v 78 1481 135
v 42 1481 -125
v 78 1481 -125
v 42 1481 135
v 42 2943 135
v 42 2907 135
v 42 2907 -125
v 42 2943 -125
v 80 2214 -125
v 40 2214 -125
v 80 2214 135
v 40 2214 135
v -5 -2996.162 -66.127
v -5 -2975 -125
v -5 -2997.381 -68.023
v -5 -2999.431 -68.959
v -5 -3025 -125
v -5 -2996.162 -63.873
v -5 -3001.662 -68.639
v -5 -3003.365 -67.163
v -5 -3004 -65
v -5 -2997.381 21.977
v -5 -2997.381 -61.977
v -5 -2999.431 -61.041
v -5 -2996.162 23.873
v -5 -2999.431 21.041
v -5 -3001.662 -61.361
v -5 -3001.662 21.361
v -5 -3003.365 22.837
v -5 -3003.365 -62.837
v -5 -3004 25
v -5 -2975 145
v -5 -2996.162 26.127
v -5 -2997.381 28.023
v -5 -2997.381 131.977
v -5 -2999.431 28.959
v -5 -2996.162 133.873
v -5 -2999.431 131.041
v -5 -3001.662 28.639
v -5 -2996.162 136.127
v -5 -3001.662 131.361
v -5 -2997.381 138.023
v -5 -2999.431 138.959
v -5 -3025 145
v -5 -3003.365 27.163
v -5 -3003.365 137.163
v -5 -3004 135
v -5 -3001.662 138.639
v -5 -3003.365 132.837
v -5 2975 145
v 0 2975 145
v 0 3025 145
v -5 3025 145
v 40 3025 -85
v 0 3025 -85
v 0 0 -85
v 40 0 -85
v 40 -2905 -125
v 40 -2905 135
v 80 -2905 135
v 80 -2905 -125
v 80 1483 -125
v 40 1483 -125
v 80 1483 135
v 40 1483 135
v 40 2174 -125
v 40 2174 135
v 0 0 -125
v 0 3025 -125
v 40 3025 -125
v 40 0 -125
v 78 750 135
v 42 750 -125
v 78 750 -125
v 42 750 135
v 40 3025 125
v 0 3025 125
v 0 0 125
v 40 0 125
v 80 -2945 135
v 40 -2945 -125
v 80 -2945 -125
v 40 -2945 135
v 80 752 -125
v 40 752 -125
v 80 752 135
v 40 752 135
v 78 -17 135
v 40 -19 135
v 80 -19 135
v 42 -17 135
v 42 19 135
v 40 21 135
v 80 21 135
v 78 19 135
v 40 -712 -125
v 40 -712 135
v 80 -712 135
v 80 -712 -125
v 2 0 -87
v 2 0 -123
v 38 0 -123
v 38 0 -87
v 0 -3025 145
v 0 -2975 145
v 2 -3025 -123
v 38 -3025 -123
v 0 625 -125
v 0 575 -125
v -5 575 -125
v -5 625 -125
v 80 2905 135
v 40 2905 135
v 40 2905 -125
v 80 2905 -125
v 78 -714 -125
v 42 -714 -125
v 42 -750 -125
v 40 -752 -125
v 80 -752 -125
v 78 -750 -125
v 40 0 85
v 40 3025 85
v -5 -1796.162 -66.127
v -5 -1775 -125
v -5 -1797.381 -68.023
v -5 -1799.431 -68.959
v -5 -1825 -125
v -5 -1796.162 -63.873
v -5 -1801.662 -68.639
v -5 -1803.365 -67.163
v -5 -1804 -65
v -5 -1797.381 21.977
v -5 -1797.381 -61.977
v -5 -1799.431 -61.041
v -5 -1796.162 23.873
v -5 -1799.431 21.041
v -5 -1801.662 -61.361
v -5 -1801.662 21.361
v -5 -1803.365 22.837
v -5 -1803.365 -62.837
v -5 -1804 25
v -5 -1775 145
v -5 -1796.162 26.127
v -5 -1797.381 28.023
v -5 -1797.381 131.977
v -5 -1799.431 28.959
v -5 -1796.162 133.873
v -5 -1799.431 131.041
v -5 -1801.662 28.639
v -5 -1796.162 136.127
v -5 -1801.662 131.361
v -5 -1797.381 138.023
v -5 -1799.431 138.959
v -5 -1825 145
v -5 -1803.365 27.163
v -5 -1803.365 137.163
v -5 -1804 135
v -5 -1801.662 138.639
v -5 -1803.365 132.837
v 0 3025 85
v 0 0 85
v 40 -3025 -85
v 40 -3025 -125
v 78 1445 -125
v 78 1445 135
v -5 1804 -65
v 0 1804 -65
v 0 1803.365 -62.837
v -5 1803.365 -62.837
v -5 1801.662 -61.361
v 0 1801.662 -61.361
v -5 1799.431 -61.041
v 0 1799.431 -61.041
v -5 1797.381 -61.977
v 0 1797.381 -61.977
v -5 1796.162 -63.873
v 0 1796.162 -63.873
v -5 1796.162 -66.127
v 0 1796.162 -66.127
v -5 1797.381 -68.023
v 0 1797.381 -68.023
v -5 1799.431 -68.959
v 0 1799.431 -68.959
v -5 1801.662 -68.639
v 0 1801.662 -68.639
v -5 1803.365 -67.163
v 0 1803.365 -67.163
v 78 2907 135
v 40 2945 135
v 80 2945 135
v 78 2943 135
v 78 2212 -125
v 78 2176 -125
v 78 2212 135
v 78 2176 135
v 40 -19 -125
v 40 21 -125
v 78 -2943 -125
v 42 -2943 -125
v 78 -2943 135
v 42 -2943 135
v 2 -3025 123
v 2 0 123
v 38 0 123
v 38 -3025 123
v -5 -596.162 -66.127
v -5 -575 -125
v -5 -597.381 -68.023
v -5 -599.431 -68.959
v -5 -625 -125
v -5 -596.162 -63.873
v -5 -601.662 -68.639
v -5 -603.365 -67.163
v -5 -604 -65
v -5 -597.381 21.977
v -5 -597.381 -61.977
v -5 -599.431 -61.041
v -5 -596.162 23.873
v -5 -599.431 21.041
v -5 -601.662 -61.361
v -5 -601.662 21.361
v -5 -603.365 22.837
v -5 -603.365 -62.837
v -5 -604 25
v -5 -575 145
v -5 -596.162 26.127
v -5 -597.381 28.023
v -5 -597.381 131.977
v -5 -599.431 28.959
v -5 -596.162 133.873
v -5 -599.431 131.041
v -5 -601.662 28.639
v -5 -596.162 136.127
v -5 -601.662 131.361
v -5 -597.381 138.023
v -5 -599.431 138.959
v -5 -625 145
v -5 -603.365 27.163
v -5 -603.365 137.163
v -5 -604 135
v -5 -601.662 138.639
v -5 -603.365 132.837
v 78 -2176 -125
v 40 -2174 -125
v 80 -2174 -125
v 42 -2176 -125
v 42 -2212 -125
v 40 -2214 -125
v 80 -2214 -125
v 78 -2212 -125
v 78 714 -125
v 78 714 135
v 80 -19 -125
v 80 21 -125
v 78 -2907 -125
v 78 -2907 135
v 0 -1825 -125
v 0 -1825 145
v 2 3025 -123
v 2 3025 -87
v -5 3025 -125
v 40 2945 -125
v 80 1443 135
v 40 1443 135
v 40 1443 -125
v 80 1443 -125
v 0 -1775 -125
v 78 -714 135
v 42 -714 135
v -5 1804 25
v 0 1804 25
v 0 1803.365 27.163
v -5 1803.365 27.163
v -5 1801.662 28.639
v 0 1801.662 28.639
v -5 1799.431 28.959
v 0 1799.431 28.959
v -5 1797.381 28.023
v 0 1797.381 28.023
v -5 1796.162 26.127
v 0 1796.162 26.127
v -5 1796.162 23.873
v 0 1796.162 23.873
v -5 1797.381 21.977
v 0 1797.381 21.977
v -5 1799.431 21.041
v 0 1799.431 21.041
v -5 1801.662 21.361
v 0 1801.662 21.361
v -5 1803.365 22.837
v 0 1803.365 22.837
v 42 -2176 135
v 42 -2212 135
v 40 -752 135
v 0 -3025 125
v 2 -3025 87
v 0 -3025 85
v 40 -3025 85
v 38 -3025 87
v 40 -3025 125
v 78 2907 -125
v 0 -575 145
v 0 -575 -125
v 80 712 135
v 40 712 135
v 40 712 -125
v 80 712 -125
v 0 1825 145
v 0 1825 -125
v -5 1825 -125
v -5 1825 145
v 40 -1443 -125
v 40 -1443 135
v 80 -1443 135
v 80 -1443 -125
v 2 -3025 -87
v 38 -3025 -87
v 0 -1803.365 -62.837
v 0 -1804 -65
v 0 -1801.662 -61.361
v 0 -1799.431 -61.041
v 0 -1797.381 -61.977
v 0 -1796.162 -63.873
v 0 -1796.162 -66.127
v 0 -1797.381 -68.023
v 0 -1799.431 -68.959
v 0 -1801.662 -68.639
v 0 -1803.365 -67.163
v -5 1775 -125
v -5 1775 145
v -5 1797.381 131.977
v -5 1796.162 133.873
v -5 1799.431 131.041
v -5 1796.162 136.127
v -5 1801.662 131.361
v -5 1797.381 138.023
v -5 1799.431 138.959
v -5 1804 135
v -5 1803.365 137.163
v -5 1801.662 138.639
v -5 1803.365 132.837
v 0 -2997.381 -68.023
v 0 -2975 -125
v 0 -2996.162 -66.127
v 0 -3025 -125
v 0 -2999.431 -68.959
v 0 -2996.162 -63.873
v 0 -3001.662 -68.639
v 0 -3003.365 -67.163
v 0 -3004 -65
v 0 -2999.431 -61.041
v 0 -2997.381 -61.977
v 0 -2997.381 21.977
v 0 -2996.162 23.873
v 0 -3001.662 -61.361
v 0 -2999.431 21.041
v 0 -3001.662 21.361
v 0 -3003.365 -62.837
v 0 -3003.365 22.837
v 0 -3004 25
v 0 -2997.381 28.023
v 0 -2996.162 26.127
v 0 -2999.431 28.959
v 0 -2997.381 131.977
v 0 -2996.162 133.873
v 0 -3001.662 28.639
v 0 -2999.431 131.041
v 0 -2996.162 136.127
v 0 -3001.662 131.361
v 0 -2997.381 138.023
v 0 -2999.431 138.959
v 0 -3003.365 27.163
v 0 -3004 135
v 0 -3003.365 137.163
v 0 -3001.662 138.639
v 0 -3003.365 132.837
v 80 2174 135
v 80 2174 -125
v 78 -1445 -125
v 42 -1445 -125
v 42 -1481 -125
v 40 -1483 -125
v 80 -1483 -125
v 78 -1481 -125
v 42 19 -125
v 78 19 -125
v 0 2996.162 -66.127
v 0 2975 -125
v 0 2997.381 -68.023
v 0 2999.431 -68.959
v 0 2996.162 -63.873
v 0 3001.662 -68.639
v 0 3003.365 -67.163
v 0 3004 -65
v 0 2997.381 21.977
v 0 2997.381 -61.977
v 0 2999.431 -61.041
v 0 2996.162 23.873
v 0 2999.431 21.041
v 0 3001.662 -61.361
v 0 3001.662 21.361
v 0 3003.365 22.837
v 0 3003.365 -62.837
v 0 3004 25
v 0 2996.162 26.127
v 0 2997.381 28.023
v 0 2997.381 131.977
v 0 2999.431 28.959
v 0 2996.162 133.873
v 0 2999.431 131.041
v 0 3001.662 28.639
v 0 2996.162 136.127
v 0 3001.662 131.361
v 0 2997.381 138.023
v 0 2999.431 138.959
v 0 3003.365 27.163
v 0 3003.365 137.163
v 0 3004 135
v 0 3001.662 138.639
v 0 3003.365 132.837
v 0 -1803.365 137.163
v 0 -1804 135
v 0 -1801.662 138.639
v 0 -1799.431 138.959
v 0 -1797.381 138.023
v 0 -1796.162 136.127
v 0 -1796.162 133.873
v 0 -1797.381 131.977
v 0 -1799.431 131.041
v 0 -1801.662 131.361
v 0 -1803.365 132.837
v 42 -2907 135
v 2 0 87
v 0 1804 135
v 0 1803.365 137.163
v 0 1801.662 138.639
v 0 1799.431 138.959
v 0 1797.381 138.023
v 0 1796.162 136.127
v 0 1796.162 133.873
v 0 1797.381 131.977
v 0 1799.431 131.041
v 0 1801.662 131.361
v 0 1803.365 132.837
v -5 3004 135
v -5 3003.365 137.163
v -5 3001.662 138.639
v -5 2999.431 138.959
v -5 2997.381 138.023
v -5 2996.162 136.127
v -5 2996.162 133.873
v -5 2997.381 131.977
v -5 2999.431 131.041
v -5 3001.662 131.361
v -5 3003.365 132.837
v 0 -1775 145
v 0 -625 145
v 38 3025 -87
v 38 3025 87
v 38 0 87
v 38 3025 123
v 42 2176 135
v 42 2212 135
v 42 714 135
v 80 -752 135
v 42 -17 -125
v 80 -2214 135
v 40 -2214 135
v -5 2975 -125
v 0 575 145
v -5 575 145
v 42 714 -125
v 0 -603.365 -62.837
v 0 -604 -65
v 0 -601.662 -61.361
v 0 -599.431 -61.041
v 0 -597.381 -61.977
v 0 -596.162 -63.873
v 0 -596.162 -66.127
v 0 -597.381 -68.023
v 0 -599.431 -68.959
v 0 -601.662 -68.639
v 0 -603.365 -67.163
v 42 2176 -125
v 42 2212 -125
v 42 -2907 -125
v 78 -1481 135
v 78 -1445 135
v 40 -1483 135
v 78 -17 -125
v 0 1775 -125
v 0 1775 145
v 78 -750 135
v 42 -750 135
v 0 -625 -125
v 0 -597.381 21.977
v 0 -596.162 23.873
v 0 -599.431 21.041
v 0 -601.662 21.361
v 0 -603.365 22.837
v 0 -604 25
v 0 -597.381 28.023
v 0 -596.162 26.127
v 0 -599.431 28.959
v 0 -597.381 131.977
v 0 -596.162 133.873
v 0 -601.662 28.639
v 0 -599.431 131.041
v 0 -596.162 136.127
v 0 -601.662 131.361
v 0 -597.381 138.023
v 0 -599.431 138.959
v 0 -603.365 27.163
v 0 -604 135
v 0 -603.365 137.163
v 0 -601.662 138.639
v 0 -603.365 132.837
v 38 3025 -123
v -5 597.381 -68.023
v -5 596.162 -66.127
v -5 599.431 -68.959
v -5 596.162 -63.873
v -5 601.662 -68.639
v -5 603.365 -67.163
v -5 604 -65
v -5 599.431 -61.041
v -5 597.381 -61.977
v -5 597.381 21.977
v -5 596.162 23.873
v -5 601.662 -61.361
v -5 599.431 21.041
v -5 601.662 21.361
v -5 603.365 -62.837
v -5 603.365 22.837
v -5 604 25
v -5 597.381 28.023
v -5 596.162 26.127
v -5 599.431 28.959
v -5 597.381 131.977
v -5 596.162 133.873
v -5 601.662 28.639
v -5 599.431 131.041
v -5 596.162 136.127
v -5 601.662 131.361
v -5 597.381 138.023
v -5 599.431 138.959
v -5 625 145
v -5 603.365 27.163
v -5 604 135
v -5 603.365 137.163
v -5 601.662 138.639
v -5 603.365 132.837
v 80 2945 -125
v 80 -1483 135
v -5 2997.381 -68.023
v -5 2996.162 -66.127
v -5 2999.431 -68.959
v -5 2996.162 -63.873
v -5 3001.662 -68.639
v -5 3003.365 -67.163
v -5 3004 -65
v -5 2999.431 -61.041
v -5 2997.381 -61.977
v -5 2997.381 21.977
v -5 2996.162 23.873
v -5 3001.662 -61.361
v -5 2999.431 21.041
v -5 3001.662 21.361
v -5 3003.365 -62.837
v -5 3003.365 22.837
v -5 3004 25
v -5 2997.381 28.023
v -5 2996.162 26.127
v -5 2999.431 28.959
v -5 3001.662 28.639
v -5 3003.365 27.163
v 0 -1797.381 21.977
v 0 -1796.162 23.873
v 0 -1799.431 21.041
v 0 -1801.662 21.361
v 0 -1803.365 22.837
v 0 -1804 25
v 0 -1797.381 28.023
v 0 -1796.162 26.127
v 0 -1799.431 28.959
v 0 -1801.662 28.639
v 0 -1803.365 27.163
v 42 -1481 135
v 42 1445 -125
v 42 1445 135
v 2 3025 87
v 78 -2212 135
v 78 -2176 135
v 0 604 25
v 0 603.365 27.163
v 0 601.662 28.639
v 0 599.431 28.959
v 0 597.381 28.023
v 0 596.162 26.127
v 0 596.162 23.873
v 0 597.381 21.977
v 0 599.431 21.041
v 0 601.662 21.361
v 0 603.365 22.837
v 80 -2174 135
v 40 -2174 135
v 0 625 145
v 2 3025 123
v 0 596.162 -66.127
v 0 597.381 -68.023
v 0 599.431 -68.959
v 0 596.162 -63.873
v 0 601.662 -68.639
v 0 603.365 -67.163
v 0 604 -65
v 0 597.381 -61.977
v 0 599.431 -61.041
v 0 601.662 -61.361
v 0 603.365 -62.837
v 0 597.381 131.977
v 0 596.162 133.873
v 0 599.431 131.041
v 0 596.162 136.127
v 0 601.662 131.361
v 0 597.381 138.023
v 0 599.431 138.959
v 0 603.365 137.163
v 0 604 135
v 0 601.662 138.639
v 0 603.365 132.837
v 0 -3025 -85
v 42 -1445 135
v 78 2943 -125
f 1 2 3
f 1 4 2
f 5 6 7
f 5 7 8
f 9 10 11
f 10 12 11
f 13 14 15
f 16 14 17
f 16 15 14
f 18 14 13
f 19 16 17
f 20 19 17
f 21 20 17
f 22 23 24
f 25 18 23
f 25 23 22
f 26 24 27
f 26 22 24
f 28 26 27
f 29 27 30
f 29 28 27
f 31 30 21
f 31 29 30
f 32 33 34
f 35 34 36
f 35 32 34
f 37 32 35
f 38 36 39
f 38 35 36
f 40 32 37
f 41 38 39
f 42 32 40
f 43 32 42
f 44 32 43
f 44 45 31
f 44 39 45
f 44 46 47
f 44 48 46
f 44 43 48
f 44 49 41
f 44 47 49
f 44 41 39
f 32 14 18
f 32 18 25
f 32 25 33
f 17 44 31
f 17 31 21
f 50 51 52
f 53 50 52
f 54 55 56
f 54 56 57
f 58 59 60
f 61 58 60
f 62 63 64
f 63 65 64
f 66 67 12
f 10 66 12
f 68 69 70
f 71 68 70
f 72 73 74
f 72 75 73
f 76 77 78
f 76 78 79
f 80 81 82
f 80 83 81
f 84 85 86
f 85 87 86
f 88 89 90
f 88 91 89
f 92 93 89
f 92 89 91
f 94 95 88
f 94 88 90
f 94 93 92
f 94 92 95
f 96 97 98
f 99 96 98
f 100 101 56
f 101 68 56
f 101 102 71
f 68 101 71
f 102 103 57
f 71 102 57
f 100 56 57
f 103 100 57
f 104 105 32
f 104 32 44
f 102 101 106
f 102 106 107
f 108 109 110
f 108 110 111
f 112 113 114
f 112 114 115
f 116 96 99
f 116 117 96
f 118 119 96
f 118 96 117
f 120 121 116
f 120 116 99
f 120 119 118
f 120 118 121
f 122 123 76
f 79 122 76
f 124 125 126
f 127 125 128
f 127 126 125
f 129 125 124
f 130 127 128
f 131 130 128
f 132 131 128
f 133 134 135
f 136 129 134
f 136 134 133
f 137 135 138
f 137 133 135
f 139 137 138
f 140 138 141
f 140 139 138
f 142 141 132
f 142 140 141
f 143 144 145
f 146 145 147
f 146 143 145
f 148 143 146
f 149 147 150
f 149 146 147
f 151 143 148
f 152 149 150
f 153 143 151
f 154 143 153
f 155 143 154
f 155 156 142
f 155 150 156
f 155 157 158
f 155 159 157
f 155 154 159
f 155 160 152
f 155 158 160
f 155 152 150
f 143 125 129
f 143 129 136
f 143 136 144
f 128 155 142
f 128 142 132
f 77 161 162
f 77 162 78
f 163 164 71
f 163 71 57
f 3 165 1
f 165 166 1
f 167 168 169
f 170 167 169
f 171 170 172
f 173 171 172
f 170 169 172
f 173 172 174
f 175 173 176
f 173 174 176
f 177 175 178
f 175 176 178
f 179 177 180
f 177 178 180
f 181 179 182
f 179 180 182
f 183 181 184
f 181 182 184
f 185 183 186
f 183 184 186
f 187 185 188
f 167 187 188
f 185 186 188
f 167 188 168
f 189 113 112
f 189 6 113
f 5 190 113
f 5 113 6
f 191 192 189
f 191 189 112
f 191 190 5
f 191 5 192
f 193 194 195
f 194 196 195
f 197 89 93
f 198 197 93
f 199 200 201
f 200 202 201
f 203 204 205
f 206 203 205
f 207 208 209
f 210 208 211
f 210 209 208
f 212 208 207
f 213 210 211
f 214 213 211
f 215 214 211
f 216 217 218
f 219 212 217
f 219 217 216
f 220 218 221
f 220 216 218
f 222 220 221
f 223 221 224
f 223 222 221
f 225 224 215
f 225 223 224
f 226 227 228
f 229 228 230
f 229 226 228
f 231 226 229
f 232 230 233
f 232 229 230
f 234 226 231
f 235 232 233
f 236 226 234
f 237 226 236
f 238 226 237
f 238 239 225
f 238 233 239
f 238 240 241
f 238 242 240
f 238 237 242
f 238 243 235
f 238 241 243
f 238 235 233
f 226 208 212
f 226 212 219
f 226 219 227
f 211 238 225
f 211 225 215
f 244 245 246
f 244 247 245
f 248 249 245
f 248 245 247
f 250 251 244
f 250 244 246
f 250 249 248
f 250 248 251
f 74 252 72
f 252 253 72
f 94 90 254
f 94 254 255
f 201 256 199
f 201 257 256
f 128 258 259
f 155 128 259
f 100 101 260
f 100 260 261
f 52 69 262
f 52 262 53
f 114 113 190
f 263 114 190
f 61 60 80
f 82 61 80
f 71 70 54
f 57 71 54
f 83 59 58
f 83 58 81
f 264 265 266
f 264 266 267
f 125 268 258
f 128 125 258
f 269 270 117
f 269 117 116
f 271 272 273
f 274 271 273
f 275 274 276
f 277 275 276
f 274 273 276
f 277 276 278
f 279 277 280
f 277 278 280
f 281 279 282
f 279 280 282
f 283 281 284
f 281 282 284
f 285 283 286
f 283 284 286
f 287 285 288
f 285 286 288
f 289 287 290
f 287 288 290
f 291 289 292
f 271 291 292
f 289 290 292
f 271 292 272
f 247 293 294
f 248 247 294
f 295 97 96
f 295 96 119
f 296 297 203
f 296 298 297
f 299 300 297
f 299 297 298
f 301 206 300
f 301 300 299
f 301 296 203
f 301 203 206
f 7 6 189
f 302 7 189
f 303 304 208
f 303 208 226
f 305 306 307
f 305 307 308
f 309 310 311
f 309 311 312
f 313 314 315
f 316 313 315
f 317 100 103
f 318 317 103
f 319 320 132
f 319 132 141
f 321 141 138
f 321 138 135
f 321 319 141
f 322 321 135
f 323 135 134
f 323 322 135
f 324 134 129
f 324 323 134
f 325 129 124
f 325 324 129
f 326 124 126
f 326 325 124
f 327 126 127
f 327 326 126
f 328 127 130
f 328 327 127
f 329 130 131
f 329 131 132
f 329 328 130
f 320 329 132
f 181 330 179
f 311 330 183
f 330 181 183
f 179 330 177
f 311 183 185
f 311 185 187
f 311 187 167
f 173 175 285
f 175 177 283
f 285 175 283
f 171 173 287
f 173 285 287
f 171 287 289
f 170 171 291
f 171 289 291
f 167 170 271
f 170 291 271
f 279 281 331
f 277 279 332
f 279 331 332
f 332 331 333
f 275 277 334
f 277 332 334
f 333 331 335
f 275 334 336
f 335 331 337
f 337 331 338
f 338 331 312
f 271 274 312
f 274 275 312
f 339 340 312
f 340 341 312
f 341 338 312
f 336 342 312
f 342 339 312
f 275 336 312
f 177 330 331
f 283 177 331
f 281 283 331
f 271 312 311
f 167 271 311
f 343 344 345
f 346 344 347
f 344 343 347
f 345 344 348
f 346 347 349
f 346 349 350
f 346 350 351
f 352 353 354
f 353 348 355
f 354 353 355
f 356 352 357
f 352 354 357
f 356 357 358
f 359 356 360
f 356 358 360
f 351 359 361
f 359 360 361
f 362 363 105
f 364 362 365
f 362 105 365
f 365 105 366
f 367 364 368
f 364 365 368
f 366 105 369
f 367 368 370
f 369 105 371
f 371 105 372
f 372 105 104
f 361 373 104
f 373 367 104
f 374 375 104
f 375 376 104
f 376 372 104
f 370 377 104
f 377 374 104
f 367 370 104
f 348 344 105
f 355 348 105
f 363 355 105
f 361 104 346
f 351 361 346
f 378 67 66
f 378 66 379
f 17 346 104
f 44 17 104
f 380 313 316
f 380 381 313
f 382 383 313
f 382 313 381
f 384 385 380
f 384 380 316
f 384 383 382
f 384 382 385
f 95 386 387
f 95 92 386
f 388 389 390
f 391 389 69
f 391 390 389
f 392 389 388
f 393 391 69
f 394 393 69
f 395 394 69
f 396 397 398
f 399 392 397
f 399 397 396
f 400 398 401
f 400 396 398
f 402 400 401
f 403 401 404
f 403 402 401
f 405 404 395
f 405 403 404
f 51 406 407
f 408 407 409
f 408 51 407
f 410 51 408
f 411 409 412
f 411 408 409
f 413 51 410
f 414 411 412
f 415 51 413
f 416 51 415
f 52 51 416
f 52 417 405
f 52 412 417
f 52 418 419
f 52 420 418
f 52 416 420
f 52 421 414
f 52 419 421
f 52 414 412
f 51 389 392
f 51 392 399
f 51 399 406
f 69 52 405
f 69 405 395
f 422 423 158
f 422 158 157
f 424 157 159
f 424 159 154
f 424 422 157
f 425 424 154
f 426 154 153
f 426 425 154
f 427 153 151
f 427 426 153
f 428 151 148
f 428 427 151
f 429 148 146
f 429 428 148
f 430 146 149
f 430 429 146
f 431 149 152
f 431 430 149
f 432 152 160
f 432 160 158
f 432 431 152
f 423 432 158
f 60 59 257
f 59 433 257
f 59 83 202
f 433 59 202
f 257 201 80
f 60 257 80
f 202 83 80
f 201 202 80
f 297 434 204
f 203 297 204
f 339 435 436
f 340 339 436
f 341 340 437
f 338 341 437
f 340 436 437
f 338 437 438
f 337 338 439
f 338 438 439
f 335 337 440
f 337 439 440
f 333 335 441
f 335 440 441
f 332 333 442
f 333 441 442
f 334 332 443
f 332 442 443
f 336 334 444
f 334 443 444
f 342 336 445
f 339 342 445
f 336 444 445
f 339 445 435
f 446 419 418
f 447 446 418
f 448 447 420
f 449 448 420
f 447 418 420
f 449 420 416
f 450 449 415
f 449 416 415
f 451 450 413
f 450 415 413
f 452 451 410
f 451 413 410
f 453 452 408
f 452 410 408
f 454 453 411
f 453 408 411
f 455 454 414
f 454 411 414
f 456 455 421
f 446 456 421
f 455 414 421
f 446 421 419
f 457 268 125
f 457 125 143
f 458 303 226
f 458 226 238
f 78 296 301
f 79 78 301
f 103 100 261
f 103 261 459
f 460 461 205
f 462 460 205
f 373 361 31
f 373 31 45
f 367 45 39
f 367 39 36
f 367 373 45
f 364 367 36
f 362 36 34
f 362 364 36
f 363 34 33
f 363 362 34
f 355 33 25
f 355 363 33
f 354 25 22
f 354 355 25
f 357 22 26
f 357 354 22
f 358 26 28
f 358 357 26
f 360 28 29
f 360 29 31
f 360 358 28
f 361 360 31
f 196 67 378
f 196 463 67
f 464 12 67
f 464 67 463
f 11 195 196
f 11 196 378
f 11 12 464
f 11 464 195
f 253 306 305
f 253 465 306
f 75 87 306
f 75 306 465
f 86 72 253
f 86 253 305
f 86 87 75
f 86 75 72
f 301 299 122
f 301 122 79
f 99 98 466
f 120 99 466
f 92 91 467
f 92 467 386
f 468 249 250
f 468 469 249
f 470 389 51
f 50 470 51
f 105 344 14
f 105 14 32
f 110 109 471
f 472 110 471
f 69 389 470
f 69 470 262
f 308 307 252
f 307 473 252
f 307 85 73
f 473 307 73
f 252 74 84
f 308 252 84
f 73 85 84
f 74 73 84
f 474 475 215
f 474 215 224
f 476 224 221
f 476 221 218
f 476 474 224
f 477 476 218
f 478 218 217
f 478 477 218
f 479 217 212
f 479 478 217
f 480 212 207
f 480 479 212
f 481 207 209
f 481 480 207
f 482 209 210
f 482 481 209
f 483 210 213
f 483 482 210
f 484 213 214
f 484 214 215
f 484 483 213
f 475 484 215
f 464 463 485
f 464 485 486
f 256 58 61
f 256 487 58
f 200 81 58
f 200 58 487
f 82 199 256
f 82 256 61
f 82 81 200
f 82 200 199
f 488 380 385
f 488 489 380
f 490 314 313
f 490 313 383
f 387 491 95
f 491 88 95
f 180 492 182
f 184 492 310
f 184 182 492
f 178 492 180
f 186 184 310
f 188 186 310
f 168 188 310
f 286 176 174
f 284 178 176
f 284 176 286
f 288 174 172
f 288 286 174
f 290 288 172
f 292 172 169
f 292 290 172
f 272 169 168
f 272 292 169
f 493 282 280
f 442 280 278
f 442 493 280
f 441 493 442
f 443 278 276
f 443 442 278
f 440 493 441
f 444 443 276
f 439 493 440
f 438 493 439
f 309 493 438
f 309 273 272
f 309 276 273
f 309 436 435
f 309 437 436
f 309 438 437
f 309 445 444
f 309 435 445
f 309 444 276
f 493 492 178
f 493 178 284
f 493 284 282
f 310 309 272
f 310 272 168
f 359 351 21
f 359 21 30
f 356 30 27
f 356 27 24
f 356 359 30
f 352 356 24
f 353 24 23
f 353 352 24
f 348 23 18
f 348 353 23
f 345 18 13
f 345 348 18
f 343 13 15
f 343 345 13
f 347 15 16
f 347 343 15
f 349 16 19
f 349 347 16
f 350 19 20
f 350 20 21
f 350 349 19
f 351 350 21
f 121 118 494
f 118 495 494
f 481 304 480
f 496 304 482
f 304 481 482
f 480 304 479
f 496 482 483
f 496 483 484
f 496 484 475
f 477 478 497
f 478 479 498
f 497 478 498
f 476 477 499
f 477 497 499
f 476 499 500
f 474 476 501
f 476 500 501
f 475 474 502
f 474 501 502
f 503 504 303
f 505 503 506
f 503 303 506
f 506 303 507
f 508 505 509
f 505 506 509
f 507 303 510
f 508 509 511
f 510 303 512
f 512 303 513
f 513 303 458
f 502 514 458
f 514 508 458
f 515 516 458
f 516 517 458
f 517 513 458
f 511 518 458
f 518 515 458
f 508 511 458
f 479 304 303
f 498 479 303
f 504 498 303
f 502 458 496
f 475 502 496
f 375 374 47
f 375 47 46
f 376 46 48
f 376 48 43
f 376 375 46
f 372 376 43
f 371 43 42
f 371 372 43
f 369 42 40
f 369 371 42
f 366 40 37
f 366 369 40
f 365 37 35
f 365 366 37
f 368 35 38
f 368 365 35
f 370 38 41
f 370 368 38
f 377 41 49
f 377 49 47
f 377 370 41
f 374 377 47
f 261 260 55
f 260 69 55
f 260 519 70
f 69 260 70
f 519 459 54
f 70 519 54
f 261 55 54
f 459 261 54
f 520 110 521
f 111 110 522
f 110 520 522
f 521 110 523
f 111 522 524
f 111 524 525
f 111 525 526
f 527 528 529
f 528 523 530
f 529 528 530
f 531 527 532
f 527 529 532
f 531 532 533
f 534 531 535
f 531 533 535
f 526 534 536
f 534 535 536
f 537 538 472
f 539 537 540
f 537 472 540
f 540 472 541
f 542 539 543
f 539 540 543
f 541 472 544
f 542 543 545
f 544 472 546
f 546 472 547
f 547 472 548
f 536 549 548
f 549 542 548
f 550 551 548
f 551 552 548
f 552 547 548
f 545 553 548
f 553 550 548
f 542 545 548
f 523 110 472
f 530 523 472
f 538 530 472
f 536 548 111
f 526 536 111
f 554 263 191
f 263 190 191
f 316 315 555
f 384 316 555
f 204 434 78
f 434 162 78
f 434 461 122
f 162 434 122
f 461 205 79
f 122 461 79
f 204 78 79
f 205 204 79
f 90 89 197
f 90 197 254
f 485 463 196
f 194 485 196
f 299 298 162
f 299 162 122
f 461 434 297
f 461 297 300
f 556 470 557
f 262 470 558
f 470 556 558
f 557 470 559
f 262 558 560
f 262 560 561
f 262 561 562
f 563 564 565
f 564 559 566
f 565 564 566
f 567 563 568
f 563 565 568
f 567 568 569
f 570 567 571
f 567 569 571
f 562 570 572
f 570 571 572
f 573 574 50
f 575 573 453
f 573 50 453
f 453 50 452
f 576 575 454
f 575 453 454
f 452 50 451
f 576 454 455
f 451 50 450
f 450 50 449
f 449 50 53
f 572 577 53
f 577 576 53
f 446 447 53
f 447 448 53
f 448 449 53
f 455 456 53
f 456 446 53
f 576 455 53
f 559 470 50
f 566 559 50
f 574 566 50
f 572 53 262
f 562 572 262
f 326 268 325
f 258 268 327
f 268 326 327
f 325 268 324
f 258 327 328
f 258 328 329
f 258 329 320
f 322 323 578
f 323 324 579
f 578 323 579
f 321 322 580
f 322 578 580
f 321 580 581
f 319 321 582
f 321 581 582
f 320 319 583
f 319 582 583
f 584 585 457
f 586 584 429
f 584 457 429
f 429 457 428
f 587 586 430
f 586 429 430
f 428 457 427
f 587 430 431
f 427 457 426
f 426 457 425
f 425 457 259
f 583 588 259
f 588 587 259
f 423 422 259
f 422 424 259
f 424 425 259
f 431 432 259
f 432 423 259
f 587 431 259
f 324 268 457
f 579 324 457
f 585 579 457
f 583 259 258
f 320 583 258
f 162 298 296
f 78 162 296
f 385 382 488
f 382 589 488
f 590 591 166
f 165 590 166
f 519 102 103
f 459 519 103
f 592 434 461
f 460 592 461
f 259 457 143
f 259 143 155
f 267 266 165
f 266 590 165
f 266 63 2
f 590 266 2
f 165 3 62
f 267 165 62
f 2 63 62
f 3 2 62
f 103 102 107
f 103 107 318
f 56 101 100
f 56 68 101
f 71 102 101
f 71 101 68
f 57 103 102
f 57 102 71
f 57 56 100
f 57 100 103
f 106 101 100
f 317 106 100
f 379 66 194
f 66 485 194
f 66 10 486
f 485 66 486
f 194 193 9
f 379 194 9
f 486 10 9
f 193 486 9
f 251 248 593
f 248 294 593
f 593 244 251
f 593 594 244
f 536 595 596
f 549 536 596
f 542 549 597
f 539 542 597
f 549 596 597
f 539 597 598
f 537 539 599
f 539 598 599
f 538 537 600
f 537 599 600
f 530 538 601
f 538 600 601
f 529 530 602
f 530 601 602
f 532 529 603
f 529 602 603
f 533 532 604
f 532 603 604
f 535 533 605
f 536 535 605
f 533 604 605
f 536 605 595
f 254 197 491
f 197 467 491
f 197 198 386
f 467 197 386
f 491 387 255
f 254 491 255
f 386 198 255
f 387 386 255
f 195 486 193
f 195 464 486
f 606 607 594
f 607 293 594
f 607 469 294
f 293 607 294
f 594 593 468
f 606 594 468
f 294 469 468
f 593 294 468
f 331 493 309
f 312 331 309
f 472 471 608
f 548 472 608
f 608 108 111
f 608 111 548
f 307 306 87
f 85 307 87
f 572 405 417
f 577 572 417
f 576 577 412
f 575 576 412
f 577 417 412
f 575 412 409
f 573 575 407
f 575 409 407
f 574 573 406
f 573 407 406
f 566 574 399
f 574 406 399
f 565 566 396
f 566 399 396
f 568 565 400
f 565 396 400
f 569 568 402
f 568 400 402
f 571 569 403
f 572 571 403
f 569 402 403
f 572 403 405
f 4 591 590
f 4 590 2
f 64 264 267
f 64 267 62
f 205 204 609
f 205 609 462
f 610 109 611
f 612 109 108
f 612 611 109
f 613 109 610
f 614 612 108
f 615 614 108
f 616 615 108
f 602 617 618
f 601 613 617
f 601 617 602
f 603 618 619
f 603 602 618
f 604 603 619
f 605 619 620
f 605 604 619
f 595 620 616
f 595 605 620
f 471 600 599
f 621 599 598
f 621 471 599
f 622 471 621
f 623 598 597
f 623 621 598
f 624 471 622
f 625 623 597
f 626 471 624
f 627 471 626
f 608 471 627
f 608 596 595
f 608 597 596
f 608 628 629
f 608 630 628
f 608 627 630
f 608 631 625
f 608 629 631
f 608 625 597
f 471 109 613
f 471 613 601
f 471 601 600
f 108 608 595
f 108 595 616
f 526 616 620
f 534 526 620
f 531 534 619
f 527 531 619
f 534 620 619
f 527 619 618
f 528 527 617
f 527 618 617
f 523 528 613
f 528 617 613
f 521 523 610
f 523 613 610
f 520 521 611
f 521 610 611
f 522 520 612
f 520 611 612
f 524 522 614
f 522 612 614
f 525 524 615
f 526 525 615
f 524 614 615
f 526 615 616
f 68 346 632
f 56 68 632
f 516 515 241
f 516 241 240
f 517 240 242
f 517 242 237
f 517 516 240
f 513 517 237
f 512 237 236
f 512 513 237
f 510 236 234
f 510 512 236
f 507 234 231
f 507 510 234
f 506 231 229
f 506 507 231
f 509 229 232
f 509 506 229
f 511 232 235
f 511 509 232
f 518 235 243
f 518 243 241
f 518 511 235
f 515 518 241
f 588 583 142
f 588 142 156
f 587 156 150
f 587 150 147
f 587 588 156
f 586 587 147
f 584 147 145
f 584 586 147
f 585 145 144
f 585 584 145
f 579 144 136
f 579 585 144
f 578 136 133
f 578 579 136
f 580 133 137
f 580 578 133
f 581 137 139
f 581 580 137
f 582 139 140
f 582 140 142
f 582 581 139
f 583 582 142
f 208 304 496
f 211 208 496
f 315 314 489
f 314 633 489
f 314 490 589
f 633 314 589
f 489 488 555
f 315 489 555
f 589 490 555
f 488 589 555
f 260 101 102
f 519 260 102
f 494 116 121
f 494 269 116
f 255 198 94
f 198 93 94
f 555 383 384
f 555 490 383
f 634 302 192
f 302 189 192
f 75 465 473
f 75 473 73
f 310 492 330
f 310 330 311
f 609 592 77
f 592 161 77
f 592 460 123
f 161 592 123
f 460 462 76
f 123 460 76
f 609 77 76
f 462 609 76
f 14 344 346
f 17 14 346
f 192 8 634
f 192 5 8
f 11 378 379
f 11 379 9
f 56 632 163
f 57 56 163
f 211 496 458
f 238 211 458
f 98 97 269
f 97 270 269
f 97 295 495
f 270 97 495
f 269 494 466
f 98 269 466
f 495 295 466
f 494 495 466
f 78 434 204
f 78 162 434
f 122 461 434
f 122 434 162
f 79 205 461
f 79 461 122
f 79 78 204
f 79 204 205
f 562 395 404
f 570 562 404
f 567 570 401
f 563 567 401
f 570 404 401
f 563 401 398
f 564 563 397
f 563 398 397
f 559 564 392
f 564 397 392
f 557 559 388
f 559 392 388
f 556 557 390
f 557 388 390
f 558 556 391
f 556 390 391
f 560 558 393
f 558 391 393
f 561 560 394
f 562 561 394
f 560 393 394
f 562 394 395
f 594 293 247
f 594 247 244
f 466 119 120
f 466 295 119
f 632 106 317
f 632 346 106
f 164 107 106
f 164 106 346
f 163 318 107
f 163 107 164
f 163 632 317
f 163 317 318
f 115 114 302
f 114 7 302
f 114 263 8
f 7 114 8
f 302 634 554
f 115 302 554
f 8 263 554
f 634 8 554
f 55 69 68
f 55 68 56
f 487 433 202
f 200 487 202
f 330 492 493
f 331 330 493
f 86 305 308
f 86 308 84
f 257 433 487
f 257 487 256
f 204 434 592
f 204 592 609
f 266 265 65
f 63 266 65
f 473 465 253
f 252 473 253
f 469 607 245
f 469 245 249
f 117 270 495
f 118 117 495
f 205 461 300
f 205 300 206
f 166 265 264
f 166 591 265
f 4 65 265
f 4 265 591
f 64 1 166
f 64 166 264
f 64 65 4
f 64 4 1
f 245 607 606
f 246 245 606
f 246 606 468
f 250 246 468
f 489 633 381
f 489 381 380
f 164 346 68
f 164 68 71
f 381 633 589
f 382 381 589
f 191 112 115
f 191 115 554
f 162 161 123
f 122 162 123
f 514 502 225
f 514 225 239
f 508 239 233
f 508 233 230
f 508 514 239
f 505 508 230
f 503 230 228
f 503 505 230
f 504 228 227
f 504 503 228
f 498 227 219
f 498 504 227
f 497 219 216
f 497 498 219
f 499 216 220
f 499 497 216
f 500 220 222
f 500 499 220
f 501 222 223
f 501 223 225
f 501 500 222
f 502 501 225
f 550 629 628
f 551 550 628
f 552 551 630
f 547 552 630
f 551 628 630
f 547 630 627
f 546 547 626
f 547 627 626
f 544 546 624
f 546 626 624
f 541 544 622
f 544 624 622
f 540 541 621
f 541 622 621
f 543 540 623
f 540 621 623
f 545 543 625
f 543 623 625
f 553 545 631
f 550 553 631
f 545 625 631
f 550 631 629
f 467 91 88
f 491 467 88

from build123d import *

# Parameters (mm, degrees)
F0_W          = 40
F0_H          = 40
F1_DEPTH      = 3025
F2_T          = -2
F2_2_T        = -2
F3_W          = 50
F3_H          = 270
F3_R          = 4
F4_DEPTH      = 5
F5_W          = 40
F5_H          = 40
F5_W_2        = 36
F5_H_2        = 36
F6_DEPTH      = 135
F6_DEPTH_BACK = 125


with BuildPart() as f1:
    # F0 (on Front) → F1 (new body)
    with BuildSketch(Plane.XZ):
        with Locations((20, 105)):
            Rectangle(F0_W, F0_H)
    extrude(amount=-F1_DEPTH)

    # F2
    f2_openings = [f1.faces().sort_by_distance(p)[0] for p in [
        (20, 0, 105),
        (20, 3025, 105),
    ]]
    offset(amount=F2_T, openings=f2_openings)


with BuildPart() as f1b:
    # F0 (on Front) → F1, piece 2 (new body)
    with BuildSketch(Plane.XZ):
        with Locations((20, -105)):
            Rectangle(F0_W, F0_H)
    extrude(amount=-F1_DEPTH)

    # F2#2
    f2_2_openings = [f1b.faces().sort_by_distance(p)[0] for p in [
        (20, 0, -105),
        (20, 3025, -105),
    ]]
    offset(amount=F2_2_T, openings=f2_2_openings)


with BuildPart() as f4:
    # F3 (on Right) → F4 (new body)
    with BuildSketch(Plane.YZ):
        with Locations((600, 10)):
            Rectangle(F3_W, F3_H)
        with Locations((600, -65)):
            Circle(F3_R, mode=Mode.SUBTRACT)
        with Locations((600, 25)):
            Circle(F3_R, mode=Mode.SUBTRACT)
        with Locations((600, 135)):
            Circle(F3_R, mode=Mode.SUBTRACT)
    extrude(amount=-F4_DEPTH)


with BuildPart() as f4b:
    # F3 (on Right) → F4, piece 2 (new body)
    with BuildSketch(Plane.YZ):
        with Locations((1800, 10)):
            Rectangle(F3_W, F3_H)
        with Locations((1800, -65)):
            Circle(F3_R, mode=Mode.SUBTRACT)
        with Locations((1800, 25)):
            Circle(F3_R, mode=Mode.SUBTRACT)
        with Locations((1800, 135)):
            Circle(F3_R, mode=Mode.SUBTRACT)
    extrude(amount=-F4_DEPTH)


with BuildPart() as f4c:
    # F3 (on Right) → F4, piece 3 (new body)
    with BuildSketch(Plane.YZ):
        with Locations((3000, 10)):
            Rectangle(F3_W, F3_H)
        with Locations((3000, -65)):
            Circle(F3_R, mode=Mode.SUBTRACT)
        with Locations((3000, 25)):
            Circle(F3_R, mode=Mode.SUBTRACT)
        with Locations((3000, 135)):
            Circle(F3_R, mode=Mode.SUBTRACT)
    extrude(amount=-F4_DEPTH)


with BuildPart() as f6:
    # F5 (on Top) → F6 (new body, two sides)
    with BuildSketch(Plane.XY) as f6_sk:
        with Locations((60, 2925)):
            Rectangle(F5_W, F5_H)
        with Locations((60, 2925)):
            Rectangle(F5_W_2, F5_H_2, mode=Mode.SUBTRACT)
    extrude(amount=F6_DEPTH)
    extrude(f6_sk.sketch, amount=-F6_DEPTH_BACK)


with BuildPart() as f6b:
    # F5 (on Top) → F6, piece 2 (new body, two sides)
    with BuildSketch(Plane.XY) as f6_2_sk:
        with Locations((60, 2194)):
            Rectangle(F5_W, F5_H)
        with Locations((60, 2194)):
            Rectangle(F5_W_2, F5_H_2, mode=Mode.SUBTRACT)
    extrude(amount=F6_DEPTH)
    extrude(f6_2_sk.sketch, amount=-F6_DEPTH_BACK)


with BuildPart() as f6c:
    # F5 (on Top) → F6, piece 3 (new body, two sides)
    with BuildSketch(Plane.XY) as f6_3_sk:
        with Locations((60, 1463)):
            Rectangle(F5_W, F5_H)
        with Locations((60, 1463)):
            Rectangle(F5_W_2, F5_H_2, mode=Mode.SUBTRACT)
    extrude(amount=F6_DEPTH)
    extrude(f6_3_sk.sketch, amount=-F6_DEPTH_BACK)


with BuildPart() as f6d:
    # F5 (on Top) → F6, piece 4 (new body, two sides)
    with BuildSketch(Plane.XY) as f6_4_sk:
        with Locations((60, 732)):
            Rectangle(F5_W, F5_H)
        with Locations((60, 732)):
            Rectangle(F5_W_2, F5_H_2, mode=Mode.SUBTRACT)
    extrude(amount=F6_DEPTH)
    extrude(f6_4_sk.sketch, amount=-F6_DEPTH_BACK)


with BuildPart() as f6e:
    # F5 (on Top) → F6, piece 5 (new body, two sides)
    with BuildSketch(Plane.XY) as f6_5_sk:
        with Locations((60, 1)):
            Rectangle(F5_W, F5_H)
        with Locations((60, 1)):
            Rectangle(F5_W_2, F5_H_2, mode=Mode.SUBTRACT)
    extrude(amount=F6_DEPTH)
    extrude(f6_5_sk.sketch, amount=-F6_DEPTH_BACK)


with BuildPart() as f7_1:
    # F7: instance of F1
    add(f1.part.mirror(Plane.XZ))


with BuildPart() as f7_2:
    # F7: instance of F1b
    add(f1b.part.mirror(Plane.XZ))


with BuildPart() as f7_3:
    # F7: instance of F4
    add(f4.part.mirror(Plane.XZ))


with BuildPart() as f7_4:
    # F7: instance of F6d
    add(f6d.part.mirror(Plane.XZ))


with BuildPart() as f7_5:
    # F7: instance of F4c
    add(f4c.part.mirror(Plane.XZ))


with BuildPart() as f7_6:
    # F7: instance of F6
    add(f6.part.mirror(Plane.XZ))


with BuildPart() as f7_7:
    # F7: instance of F6b
    add(f6b.part.mirror(Plane.XZ))


with BuildPart() as f7_8:
    # F7: instance of F4b
    add(f4b.part.mirror(Plane.XZ))


with BuildPart() as f7_9:
    # F7: instance of F6c
    add(f6c.part.mirror(Plane.XZ))


solid = Compound([f1.part, f1b.part, f4.part, f4b.part, f4c.part, f6.part, f6b.part, f6c.part, f6d.part, f6e.part, f7_1.part, f7_2.part, f7_3.part, f7_4.part, f7_5.part, f7_6.part, f7_7.part, f7_8.part, f7_9.part])
